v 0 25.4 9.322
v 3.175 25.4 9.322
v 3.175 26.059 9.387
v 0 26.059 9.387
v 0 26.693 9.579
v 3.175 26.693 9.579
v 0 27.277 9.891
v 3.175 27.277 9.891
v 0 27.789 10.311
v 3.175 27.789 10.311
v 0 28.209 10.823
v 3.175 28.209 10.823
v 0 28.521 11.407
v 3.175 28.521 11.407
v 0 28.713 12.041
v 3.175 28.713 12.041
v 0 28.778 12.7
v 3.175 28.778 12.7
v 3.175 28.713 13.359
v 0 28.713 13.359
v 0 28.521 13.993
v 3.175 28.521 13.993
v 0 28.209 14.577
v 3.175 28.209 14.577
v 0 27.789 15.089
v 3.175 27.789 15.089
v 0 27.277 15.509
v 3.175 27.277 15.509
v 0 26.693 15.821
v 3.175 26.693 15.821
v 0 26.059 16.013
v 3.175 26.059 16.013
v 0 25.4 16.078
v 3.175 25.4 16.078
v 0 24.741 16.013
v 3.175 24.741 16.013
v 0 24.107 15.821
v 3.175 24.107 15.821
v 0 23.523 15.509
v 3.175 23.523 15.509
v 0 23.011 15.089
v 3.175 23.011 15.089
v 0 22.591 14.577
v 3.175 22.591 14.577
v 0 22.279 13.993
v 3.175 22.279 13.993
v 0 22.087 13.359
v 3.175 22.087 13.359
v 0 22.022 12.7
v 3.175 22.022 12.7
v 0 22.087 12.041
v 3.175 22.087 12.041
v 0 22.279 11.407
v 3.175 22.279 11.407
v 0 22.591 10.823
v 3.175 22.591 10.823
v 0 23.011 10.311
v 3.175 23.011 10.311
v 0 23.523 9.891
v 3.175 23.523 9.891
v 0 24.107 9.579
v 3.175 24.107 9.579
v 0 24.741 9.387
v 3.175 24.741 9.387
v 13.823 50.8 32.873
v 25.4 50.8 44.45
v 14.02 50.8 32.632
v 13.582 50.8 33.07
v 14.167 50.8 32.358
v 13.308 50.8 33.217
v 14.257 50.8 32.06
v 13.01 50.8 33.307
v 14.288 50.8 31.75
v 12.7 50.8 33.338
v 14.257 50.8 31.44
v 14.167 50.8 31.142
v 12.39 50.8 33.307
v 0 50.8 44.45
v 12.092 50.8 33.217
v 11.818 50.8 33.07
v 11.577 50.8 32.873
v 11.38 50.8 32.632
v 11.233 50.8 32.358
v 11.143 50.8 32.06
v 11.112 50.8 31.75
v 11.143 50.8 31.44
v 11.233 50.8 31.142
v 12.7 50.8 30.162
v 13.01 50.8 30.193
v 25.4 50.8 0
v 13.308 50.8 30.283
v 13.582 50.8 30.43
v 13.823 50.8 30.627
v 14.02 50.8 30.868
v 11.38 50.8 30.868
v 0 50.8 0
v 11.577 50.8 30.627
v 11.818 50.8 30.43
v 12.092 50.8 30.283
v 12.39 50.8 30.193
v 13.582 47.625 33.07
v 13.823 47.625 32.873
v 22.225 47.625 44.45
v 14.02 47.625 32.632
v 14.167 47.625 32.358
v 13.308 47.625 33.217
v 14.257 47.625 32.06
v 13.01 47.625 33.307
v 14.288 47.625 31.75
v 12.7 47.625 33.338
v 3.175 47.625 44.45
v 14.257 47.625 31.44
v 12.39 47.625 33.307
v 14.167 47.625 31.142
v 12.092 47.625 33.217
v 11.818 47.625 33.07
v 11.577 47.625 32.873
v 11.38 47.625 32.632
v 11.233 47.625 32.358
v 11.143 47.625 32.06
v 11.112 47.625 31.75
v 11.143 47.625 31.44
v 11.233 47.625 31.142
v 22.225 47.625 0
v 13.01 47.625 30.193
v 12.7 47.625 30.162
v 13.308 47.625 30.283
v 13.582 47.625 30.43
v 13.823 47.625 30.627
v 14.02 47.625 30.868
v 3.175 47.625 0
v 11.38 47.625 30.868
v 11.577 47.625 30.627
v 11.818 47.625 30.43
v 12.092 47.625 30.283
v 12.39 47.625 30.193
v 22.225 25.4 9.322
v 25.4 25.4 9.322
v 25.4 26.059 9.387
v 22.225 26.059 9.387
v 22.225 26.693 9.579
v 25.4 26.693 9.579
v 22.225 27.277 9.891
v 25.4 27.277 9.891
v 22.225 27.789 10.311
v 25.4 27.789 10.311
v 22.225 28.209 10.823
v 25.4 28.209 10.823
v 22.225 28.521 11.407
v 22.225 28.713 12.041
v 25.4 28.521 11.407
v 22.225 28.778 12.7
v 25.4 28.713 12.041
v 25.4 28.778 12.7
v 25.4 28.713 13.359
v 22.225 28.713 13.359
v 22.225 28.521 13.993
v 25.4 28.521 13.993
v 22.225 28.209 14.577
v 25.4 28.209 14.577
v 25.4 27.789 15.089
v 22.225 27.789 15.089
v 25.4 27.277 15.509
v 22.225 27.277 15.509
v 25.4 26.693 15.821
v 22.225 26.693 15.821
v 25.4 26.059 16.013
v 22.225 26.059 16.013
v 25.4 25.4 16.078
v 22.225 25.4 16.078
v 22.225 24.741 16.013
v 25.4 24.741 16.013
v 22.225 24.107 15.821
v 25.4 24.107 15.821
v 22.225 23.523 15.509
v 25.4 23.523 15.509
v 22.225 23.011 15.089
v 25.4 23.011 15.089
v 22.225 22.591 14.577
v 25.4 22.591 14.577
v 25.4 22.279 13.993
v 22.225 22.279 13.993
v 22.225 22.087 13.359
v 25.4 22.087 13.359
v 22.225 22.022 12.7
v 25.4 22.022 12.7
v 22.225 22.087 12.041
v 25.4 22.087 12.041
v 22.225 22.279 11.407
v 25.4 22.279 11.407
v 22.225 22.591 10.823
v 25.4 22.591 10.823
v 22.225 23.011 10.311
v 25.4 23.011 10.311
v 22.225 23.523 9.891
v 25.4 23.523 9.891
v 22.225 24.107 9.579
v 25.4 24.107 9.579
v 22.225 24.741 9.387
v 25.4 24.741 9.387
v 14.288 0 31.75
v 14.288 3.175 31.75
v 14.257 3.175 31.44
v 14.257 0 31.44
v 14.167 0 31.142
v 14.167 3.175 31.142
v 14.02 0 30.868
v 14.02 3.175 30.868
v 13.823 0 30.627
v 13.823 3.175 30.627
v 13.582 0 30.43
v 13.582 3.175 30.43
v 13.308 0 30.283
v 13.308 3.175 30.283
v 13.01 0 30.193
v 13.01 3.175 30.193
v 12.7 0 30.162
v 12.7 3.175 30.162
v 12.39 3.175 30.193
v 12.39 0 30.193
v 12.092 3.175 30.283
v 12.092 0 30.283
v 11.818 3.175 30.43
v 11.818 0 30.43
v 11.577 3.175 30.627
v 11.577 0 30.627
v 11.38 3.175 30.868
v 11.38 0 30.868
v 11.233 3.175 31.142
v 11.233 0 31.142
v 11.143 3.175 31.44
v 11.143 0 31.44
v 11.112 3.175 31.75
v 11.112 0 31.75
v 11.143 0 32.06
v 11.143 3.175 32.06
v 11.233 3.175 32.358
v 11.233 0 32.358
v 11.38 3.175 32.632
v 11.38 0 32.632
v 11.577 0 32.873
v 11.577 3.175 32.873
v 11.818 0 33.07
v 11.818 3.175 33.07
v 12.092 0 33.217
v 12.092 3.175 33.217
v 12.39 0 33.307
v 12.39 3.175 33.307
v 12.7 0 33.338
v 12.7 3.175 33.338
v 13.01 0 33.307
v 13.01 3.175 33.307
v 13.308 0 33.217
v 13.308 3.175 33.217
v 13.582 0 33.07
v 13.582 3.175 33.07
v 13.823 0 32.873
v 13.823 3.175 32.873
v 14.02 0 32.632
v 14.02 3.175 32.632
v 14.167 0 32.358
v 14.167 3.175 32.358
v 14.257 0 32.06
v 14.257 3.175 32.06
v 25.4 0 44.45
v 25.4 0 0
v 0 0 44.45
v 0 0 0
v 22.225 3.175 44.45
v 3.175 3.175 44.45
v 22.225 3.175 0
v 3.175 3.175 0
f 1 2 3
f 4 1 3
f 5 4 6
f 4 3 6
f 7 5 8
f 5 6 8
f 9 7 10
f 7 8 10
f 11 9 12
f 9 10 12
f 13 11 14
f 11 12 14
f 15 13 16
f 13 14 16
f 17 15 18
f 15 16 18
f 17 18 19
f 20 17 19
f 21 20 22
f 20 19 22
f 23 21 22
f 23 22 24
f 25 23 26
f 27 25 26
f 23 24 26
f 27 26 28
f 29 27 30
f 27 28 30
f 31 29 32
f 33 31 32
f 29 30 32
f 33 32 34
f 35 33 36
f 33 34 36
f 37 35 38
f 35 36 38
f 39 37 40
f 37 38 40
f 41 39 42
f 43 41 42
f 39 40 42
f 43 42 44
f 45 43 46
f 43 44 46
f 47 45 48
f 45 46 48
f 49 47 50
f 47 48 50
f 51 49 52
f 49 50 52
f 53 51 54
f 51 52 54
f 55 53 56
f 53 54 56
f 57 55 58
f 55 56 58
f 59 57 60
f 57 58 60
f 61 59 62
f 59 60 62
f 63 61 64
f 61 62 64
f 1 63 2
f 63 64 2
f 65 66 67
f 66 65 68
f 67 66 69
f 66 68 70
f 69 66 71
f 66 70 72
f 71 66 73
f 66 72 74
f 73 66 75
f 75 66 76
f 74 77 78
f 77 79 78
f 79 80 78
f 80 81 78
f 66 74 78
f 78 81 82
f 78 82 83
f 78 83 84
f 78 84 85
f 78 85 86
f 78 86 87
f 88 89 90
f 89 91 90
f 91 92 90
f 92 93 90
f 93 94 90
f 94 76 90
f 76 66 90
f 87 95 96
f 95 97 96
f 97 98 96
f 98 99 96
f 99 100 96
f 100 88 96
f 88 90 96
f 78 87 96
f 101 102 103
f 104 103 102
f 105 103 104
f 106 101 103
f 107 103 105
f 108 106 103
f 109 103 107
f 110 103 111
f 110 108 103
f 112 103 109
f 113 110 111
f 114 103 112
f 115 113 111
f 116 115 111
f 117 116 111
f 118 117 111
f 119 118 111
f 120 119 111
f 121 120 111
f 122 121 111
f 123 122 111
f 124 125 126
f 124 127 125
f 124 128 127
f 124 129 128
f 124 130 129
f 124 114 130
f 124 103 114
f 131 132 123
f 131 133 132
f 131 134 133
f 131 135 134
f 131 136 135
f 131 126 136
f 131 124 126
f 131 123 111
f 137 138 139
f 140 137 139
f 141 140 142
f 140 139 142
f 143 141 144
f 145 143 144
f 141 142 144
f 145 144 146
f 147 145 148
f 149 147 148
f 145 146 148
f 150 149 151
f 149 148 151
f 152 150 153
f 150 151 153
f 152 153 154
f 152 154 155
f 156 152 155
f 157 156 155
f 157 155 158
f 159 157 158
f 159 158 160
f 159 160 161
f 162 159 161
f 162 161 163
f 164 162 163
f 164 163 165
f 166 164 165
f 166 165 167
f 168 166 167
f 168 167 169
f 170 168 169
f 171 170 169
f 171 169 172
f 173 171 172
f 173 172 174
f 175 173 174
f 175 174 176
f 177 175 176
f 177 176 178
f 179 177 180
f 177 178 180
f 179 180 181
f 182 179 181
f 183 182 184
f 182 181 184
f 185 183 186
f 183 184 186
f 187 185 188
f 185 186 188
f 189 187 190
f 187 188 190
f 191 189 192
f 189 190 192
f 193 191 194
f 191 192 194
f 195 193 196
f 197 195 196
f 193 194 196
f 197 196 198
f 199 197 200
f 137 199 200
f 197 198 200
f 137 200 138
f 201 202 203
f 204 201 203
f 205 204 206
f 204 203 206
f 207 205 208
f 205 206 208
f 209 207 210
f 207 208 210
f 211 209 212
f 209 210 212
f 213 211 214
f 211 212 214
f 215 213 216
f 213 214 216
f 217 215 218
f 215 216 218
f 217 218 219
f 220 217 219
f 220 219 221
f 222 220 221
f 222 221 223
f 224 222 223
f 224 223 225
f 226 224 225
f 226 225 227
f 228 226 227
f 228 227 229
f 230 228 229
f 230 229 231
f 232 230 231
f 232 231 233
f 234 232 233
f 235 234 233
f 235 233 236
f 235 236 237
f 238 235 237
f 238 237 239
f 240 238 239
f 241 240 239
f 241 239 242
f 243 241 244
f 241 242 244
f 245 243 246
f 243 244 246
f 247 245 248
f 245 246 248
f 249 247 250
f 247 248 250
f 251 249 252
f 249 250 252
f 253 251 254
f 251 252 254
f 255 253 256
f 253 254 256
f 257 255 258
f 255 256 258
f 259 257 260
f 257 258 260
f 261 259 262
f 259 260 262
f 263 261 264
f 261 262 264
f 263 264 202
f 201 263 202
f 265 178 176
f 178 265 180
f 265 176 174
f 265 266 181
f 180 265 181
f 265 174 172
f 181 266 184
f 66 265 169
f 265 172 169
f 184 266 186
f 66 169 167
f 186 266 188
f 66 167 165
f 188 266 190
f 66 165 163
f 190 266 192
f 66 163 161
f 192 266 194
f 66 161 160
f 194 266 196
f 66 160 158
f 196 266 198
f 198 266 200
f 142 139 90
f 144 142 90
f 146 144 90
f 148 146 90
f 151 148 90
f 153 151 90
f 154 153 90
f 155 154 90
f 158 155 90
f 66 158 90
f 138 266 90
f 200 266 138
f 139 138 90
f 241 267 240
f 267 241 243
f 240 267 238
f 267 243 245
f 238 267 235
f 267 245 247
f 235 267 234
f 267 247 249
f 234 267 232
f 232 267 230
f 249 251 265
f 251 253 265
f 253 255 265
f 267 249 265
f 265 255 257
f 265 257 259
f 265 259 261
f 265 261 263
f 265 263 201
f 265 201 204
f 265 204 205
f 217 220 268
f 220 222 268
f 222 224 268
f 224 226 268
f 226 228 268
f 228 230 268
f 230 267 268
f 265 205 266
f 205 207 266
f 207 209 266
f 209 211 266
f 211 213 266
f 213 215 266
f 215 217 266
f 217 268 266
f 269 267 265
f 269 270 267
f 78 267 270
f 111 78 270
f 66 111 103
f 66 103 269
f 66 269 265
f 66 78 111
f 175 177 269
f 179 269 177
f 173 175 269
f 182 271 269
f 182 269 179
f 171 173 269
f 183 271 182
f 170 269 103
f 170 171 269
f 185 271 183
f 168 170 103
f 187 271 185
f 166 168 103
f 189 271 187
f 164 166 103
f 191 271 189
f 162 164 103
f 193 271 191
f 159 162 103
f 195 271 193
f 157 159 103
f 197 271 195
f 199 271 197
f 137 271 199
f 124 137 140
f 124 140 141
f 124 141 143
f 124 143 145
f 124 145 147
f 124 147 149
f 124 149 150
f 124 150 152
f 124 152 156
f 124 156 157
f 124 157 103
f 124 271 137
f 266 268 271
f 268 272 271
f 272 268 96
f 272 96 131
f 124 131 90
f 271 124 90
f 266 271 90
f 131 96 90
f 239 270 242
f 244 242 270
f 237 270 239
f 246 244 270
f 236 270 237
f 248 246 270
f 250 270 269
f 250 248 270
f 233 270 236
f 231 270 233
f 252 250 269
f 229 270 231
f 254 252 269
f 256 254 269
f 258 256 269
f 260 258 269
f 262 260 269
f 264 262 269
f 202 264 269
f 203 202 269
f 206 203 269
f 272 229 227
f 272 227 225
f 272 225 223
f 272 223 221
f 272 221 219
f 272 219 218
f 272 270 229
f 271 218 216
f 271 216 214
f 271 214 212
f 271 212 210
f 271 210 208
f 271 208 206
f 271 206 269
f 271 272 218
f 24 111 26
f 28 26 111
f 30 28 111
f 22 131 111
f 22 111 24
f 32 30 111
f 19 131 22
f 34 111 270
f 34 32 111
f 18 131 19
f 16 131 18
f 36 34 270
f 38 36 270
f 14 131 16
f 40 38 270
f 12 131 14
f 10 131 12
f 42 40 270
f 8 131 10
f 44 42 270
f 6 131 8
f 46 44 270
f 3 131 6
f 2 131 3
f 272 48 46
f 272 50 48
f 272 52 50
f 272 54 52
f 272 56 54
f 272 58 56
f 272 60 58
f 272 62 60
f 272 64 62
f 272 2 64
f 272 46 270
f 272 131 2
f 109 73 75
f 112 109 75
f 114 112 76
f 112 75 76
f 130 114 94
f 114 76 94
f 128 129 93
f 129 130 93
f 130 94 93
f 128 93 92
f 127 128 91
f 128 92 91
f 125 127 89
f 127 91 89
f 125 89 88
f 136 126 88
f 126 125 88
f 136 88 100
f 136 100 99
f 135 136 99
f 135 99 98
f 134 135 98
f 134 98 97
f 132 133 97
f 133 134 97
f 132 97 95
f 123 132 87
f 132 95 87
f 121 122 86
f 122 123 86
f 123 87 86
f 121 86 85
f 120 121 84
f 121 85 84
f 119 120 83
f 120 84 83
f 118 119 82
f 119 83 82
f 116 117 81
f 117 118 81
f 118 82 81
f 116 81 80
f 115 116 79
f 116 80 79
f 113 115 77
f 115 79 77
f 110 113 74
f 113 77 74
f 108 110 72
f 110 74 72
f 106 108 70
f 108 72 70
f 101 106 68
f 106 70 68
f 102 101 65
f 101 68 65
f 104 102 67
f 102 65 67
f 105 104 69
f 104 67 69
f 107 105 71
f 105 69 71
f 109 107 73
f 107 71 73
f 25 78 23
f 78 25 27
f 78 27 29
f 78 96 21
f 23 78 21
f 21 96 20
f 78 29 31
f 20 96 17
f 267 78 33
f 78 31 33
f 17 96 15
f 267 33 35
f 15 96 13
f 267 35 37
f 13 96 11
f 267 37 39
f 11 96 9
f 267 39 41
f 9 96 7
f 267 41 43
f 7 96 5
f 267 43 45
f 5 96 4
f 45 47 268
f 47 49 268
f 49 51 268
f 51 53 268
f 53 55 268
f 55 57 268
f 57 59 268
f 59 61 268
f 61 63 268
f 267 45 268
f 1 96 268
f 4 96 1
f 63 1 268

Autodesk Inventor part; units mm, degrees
ref_plane "YZ Plane" through (0, 0, 0) normal (1, 0, 0) x (0, 1, 0)
ref_plane "XZ Plane" through (0, 0, 0) normal (0, 1, 0) x (-1, 0, 0)
ref_plane "XY Plane" through (0, 0, 0) normal (0, 0, 1) x (1, 0, 0)
sketch "Sketch1" plane through (0, 0, 0) normal (0, 0, 1) x (1, 0, 0)
  line L0 (0, 0) -> (25.4, 0)
  line L1 (25.4, 0) -> (25.4, 50.8)
  line L2 (25.4, 50.8) -> (0, 50.8)
  line L3 (0, 50.8) -> (0, 0)
  dimension "d0" = 25.4
  dimension "d1" = 50.8
extrude "Extrusion1" add sketch "Sketch1" along normal blind 44.45
shell "Shell2" thickness 3.175 removed faces 2 at (8.4667, 16.9333, 0) at (8.4667, 16.9333, 44.45)
sketch "Sketch2" plane through (25.4, 0, 0) normal (1, 0, 0) x (0, 0, -1)
  circle A0 centre (-12.7, 25.4) radius 3.3782
  line L0 (0, 0) -> (0, 50.8) projected
  line L1 (0, 50.8) -> (-44.45, 50.8) projected
  dimension "d6" = 12.7
  dimension "d7" = 6.7564
  dimension "d8" = 25.4
extrude "Extrusion2" cut sketch "Sketch2" against normal blind 63.5
sketch "Sketch3" plane through (0, 50.8, 0) normal (0, 1, 0) x (1, 0, 0)
  line L0 (25.4, -44.45) -> (0, -44.45) projected
  line L1 (12.7, -44.45) -> (12.7, -31.75)
  circle A0 centre (12.7, -31.75) radius 1.5875
  point P0 (0, 0)
  dimension "d11" = 12.7
  dimension "d12" = 3.175
extrude "Extrusion3" cut sketch "Sketch3" against normal blind 63.5
properties part number "bumper beam" material "Aluminum 6061"
